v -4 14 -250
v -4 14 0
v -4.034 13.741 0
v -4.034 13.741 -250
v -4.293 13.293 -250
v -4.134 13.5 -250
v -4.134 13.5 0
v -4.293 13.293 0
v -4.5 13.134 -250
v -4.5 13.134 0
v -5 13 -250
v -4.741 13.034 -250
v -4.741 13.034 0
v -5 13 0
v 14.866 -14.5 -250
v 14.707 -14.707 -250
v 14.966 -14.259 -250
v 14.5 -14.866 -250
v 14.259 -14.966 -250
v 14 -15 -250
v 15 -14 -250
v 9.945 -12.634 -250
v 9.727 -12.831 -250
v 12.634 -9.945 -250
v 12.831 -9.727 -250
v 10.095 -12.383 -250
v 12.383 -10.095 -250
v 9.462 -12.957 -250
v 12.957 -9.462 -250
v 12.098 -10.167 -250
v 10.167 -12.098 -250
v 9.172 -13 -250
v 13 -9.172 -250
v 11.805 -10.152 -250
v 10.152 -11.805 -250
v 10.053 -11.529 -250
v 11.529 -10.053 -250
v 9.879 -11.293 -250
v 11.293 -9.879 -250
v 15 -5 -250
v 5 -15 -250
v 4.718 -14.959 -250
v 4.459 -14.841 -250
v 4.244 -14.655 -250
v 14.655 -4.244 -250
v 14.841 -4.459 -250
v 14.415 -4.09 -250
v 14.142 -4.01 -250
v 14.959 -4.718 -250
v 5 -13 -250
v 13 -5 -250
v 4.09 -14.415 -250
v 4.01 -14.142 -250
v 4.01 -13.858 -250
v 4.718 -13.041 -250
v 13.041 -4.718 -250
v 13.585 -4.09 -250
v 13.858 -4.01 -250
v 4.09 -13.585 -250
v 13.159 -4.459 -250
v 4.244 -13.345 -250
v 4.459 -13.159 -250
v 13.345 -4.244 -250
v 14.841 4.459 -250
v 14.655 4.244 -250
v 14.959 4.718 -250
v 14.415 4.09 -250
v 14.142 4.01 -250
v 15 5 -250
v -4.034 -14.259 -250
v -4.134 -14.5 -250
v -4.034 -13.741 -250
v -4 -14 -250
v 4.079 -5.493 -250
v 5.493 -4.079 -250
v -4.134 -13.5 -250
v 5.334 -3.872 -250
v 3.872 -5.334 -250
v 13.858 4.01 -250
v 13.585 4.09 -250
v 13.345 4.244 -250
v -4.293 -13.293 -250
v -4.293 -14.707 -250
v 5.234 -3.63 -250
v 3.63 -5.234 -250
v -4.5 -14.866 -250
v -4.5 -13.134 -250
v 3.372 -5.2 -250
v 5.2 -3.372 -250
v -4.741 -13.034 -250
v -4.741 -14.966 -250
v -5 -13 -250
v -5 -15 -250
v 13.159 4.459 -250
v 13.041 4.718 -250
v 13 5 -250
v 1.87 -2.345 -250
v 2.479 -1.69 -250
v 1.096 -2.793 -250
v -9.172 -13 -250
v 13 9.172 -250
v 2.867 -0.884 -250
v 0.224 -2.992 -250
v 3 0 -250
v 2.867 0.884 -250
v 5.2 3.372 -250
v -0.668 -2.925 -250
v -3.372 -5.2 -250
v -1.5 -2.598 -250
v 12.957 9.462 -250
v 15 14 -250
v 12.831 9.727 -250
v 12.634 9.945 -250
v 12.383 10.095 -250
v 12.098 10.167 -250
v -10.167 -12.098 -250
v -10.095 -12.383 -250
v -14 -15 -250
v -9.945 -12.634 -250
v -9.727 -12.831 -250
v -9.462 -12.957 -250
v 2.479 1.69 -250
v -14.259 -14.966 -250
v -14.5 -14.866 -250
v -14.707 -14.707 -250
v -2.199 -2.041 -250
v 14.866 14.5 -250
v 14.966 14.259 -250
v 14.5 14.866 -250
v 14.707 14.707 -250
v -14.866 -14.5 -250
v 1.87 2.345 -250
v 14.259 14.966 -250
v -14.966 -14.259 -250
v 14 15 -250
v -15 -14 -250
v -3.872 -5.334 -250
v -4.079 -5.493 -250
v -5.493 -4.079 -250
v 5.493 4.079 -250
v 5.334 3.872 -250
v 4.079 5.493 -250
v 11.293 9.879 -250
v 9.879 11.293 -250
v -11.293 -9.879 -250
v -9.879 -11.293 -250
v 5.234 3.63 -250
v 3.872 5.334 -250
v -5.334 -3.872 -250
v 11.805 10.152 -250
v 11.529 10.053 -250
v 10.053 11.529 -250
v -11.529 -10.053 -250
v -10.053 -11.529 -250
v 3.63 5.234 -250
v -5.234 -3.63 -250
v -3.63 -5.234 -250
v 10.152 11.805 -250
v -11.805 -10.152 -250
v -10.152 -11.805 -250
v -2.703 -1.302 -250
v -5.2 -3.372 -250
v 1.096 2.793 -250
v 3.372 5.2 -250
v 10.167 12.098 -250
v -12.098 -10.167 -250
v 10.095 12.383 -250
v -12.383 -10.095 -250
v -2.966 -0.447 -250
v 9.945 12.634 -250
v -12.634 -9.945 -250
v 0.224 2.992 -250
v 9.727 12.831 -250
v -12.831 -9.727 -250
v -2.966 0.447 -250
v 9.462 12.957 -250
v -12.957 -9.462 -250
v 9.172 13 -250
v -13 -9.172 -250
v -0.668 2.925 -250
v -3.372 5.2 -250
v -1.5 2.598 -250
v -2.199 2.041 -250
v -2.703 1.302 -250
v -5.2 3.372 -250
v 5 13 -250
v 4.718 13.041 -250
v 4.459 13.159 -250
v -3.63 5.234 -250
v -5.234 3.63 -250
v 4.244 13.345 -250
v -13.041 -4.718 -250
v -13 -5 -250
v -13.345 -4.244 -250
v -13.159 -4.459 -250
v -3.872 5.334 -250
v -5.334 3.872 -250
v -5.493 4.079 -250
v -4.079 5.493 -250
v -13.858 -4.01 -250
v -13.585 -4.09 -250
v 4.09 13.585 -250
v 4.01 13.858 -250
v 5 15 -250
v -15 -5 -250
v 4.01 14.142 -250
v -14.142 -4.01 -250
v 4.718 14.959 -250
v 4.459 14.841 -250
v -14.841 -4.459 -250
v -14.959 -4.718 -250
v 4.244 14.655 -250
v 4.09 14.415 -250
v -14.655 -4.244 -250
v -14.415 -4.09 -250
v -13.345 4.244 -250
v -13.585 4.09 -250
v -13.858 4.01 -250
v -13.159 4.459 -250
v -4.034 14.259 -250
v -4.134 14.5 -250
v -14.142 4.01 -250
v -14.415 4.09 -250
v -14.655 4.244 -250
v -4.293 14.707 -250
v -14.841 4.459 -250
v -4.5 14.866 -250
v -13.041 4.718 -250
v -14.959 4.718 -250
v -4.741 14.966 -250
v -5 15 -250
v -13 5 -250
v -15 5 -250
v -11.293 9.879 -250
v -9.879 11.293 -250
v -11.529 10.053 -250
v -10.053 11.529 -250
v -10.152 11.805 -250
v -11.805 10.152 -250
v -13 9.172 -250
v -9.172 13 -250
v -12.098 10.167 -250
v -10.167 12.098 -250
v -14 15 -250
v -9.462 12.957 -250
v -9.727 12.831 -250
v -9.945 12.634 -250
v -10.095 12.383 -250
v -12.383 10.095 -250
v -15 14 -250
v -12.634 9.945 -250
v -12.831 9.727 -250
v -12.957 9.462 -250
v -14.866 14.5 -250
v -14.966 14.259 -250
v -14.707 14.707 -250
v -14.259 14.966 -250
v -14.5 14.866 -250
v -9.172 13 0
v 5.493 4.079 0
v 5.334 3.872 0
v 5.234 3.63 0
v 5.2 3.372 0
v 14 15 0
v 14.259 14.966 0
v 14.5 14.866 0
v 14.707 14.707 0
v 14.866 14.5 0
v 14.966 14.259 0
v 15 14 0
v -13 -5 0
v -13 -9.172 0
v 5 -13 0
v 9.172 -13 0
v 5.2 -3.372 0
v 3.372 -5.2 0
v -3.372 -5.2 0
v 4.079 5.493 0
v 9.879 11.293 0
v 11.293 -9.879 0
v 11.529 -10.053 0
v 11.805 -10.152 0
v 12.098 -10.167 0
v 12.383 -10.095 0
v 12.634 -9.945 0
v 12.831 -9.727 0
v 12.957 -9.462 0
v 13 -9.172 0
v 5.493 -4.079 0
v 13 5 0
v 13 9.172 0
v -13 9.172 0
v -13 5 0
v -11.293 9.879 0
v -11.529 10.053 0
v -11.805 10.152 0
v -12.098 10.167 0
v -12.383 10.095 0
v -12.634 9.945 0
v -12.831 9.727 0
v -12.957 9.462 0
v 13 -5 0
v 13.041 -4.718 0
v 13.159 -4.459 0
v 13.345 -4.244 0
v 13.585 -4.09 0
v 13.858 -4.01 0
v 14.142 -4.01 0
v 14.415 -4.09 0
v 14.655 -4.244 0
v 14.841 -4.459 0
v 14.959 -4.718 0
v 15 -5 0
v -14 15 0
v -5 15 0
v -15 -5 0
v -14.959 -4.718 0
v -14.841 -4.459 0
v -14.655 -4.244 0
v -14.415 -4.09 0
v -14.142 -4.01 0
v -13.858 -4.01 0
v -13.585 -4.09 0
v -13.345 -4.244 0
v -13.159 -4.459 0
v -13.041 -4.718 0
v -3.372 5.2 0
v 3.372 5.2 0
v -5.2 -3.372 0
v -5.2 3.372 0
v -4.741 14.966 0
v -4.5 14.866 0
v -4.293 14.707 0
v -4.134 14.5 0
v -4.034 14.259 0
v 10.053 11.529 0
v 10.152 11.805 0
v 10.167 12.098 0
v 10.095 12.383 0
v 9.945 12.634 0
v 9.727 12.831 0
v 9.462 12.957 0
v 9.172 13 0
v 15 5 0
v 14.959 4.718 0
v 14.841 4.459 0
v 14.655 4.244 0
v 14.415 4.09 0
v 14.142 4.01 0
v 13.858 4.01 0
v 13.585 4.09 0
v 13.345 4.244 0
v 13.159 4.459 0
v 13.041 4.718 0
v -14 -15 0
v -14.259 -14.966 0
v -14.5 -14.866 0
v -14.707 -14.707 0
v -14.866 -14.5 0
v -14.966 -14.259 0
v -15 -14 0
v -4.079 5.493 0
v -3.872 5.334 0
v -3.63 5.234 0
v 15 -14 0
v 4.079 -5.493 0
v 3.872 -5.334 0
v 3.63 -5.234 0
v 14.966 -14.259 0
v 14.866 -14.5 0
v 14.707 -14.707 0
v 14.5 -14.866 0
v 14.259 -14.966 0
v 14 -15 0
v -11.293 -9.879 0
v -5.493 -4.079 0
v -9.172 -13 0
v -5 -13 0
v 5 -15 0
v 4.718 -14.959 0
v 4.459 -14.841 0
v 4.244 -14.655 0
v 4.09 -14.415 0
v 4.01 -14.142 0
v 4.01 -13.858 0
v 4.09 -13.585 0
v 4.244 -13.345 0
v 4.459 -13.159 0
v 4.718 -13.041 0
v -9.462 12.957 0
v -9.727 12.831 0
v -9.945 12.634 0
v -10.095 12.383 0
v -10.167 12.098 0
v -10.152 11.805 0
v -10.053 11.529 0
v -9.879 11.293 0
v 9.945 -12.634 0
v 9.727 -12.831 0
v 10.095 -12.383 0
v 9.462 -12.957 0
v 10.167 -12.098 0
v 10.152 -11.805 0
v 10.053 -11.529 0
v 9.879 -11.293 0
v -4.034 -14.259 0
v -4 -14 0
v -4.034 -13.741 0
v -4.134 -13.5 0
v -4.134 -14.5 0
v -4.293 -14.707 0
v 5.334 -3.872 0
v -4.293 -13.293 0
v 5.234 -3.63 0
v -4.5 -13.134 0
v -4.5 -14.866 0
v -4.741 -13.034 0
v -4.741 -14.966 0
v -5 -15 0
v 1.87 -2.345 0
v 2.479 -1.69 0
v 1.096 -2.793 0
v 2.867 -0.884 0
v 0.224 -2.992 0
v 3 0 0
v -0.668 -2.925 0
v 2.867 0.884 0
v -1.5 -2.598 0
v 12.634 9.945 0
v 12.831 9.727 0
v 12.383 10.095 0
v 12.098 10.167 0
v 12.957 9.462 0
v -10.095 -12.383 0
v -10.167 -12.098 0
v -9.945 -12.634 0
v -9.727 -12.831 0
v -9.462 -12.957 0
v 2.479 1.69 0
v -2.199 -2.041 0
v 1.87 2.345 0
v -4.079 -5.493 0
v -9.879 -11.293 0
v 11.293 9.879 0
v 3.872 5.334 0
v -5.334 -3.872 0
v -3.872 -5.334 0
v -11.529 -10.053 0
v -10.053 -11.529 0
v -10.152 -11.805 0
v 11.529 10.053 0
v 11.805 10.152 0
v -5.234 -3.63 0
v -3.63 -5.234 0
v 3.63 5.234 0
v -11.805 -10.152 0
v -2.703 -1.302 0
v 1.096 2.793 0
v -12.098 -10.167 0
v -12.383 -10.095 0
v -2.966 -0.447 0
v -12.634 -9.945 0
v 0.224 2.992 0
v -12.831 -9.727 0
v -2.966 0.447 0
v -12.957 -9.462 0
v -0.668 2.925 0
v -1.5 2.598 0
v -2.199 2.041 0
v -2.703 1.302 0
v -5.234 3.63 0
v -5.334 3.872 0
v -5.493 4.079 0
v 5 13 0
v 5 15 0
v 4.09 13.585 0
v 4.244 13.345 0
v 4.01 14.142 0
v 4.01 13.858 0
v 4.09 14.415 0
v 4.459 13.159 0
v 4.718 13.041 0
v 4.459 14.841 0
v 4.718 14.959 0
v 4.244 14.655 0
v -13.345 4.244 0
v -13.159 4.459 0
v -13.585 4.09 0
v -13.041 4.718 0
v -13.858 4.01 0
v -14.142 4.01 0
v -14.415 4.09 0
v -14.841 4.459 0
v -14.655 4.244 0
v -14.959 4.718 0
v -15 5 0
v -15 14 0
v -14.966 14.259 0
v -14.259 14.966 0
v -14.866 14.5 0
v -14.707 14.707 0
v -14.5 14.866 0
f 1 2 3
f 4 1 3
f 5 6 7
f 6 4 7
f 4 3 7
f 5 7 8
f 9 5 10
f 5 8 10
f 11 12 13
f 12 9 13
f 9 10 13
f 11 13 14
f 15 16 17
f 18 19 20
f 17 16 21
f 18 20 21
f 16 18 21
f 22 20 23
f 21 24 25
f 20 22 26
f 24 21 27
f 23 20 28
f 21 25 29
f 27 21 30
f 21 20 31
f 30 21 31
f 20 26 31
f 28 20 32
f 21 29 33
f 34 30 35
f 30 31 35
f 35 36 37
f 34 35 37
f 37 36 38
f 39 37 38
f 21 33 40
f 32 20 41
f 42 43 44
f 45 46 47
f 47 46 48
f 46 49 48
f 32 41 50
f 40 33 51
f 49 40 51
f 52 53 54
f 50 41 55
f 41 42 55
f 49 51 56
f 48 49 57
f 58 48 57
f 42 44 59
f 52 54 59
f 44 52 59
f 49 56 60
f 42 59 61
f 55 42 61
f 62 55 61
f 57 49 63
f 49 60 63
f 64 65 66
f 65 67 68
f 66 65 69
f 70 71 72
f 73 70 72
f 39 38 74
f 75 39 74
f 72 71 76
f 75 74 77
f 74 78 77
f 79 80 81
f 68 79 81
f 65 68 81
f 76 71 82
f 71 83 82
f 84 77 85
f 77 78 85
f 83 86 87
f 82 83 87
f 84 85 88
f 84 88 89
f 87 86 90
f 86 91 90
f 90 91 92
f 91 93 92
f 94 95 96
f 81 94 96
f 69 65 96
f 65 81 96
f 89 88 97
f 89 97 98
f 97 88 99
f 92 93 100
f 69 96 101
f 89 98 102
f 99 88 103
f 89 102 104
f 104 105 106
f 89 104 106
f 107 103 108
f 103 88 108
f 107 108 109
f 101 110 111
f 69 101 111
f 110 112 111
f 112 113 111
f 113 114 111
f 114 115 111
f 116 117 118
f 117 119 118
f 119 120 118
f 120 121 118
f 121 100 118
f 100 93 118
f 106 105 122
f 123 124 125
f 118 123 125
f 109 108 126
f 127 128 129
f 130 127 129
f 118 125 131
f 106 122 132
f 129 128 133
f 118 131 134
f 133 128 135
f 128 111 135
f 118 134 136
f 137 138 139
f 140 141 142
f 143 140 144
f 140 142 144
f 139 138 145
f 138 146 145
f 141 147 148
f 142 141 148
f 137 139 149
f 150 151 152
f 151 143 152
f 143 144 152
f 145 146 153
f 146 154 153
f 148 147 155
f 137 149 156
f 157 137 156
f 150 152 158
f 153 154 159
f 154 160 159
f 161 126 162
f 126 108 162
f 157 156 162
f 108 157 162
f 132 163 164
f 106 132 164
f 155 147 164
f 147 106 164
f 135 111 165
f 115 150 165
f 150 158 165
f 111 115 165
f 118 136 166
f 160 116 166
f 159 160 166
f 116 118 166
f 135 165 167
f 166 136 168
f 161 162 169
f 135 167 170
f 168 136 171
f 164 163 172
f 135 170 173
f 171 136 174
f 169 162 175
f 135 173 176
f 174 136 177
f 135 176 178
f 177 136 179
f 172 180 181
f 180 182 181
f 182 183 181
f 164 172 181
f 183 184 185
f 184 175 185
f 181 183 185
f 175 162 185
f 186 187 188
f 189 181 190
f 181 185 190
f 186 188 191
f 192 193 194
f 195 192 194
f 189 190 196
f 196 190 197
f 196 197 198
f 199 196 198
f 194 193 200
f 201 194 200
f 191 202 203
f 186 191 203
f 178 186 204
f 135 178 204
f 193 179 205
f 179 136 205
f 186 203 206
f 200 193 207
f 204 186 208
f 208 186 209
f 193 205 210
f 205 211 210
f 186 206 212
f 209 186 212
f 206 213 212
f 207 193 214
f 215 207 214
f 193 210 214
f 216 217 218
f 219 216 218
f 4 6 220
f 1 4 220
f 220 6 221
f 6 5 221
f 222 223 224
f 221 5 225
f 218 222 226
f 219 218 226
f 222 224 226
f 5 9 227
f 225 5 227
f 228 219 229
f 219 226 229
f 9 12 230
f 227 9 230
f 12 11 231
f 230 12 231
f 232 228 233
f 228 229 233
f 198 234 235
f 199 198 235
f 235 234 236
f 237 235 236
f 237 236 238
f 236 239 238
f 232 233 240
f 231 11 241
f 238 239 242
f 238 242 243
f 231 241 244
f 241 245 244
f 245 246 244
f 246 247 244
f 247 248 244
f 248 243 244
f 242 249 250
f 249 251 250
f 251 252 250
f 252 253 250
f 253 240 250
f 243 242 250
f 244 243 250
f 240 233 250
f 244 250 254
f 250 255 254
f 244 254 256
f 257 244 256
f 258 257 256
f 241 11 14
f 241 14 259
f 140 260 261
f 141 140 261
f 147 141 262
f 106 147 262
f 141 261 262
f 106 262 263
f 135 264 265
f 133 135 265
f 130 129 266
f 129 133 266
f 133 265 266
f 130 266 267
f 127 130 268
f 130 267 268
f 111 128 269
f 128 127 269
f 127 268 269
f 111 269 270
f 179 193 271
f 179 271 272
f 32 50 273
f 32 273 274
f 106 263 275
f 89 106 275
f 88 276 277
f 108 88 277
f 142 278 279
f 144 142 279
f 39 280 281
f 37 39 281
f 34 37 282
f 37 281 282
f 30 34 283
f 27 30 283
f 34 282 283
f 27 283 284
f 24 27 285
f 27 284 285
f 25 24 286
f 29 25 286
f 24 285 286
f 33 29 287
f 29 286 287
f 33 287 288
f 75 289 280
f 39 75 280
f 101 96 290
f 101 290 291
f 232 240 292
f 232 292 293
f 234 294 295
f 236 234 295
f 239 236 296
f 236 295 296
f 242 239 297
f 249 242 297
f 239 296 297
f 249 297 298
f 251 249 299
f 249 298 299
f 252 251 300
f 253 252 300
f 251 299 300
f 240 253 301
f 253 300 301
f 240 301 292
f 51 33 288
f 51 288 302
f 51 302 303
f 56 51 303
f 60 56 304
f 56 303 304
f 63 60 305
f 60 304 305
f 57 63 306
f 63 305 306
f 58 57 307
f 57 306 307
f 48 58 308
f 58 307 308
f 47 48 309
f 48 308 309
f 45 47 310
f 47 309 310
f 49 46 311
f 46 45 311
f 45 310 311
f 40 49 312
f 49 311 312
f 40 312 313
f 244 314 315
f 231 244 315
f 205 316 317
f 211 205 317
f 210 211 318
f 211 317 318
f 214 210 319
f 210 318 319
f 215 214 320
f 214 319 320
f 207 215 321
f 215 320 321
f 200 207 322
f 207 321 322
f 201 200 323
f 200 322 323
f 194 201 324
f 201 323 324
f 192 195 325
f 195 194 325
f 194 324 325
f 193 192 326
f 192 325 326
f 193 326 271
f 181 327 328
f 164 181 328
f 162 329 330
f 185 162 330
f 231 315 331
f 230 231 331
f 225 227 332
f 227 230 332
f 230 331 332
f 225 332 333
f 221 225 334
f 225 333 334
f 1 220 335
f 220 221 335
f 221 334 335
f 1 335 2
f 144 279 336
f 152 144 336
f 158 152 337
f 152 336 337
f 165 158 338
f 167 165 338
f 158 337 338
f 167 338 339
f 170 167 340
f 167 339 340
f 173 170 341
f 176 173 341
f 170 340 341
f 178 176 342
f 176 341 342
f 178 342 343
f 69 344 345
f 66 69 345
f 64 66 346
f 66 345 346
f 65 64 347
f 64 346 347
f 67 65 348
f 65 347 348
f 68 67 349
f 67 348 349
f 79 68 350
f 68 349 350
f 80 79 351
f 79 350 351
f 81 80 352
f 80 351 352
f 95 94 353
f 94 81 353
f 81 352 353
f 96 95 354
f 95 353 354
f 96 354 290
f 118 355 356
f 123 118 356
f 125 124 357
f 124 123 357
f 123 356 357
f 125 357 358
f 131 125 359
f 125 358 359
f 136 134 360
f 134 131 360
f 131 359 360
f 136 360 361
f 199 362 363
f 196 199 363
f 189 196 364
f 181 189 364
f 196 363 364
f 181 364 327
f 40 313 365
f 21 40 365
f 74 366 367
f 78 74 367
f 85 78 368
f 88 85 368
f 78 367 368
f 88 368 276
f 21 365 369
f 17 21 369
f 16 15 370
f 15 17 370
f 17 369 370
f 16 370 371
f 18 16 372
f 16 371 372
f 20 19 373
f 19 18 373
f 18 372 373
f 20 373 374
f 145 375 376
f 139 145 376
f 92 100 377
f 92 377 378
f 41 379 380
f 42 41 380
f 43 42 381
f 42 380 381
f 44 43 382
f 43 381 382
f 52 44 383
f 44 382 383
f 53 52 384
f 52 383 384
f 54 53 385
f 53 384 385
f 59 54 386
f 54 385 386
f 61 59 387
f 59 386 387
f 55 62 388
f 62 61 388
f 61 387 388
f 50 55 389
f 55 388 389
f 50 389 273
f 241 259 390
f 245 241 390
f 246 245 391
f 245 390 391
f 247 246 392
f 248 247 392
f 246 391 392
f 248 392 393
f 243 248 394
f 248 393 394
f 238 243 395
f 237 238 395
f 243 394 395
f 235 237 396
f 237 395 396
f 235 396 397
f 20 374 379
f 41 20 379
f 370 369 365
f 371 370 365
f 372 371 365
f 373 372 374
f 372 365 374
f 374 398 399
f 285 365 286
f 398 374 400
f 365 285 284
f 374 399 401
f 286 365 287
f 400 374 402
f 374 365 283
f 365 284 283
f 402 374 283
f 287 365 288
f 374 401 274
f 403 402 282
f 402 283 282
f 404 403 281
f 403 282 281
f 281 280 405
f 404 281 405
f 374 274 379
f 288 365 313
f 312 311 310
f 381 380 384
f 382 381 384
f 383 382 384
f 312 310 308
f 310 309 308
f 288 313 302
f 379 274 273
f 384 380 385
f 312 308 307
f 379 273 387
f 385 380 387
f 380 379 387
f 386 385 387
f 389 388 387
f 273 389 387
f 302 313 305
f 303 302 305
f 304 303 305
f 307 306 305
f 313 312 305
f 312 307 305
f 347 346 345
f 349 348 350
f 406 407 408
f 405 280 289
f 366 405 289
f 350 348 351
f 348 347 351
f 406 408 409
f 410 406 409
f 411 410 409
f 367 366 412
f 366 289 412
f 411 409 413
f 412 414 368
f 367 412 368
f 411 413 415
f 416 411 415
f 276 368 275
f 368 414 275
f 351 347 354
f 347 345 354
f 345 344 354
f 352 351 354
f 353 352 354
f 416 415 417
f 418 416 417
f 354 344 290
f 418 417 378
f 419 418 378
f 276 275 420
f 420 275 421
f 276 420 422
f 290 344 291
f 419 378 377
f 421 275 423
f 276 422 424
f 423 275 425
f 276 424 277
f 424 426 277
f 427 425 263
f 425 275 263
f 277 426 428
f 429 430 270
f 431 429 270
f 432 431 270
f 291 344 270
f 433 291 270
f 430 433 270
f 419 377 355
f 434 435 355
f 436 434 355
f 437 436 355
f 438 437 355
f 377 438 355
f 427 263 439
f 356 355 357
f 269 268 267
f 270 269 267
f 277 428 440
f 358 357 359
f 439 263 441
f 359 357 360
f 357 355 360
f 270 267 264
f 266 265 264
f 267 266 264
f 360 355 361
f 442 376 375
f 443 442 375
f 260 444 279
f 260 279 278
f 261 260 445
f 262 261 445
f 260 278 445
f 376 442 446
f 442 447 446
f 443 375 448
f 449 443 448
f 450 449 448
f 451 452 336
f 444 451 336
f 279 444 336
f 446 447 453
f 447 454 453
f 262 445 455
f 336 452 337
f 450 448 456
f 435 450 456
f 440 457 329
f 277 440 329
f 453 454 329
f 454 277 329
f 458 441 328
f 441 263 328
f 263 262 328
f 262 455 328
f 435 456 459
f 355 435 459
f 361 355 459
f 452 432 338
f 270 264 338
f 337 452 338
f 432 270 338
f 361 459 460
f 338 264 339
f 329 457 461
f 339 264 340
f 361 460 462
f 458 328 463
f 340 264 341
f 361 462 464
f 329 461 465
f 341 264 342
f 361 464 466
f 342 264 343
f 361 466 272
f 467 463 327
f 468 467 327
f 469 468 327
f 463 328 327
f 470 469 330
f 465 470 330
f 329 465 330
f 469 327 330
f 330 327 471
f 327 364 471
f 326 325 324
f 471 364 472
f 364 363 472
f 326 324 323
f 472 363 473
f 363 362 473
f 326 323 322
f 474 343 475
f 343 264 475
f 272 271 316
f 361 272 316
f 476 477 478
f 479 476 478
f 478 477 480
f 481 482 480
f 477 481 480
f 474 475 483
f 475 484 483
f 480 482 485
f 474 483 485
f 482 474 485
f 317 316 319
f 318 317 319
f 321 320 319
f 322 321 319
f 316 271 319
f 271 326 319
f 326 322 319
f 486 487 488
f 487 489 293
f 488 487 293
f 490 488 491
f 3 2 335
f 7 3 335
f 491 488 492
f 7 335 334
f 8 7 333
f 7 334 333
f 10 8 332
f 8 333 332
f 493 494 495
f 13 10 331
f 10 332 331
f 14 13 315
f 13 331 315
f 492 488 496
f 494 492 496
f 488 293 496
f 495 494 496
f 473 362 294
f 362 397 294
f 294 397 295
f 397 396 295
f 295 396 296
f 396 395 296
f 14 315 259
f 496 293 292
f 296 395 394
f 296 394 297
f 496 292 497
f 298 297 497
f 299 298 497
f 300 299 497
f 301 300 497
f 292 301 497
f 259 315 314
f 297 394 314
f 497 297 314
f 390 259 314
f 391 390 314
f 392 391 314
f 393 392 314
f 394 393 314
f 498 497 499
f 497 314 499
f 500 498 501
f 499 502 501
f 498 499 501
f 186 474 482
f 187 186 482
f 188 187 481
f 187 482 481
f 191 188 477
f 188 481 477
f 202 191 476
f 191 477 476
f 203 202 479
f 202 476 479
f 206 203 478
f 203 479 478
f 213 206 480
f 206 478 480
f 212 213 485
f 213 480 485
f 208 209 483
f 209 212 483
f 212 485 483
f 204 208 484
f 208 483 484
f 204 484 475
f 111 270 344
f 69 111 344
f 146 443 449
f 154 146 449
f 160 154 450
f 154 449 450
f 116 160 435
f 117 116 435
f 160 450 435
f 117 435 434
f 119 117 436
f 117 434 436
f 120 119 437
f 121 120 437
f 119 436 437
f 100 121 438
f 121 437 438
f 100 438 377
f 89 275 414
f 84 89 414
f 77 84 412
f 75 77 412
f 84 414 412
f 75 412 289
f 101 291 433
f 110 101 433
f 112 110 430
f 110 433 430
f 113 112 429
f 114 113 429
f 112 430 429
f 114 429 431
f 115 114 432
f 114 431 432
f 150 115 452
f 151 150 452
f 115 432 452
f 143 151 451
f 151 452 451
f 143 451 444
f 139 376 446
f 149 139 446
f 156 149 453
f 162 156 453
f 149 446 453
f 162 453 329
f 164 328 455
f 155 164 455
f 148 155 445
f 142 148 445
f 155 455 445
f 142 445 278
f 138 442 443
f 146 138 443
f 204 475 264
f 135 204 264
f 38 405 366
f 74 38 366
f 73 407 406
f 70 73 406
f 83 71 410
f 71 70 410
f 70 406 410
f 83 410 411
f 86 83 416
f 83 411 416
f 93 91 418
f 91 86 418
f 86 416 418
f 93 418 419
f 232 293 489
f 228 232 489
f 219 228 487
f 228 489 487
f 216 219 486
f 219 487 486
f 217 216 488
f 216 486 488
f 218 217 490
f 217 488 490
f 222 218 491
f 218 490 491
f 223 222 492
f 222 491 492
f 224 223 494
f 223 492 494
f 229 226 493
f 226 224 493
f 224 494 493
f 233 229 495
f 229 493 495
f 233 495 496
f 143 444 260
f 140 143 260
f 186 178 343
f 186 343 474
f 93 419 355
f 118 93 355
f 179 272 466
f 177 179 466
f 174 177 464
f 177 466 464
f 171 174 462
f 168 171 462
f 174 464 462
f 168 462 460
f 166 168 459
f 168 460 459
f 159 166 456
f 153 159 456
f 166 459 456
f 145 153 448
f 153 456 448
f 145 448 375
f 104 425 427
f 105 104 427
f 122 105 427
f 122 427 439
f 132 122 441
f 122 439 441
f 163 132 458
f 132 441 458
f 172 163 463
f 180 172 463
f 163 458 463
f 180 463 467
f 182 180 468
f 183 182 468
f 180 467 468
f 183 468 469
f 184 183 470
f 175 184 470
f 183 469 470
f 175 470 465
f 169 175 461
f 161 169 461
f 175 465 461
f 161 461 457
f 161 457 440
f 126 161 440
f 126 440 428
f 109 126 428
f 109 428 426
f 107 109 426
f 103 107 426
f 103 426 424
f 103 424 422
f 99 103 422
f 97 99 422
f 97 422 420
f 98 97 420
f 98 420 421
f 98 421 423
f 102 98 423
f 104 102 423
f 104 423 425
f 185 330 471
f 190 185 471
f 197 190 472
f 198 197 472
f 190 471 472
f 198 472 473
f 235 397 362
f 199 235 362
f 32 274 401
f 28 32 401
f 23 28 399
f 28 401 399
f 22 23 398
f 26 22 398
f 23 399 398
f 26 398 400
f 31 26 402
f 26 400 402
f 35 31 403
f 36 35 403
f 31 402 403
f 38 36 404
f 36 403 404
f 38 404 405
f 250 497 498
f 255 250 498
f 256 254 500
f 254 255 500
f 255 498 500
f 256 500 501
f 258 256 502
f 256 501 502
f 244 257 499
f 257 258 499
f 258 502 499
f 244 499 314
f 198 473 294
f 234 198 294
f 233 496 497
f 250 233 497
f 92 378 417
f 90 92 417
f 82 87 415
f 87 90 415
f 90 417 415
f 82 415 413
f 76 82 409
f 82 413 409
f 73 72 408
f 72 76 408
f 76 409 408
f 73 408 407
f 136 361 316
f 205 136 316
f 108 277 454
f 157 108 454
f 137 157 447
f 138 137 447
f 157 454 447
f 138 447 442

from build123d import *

# Parameters (mm, degrees)
SALIENTE_EXTRUIR1_DEPTH = 1400
CROQUIS2_R              = 3
CORTAR_EXTRUIR1_DEPTH   = 1401.160705062
CORTAR_EXTRUIR3_DEPTH   = 1401.160705062
CROQUIS4_W              = 1150
CROQUIS4_H              = 72.748415438
CORTAR_EXTRUIR5_DEPTH   = 254


with BuildPart() as part:
    # Croquis1 → Saliente-Extruir1 (new body)
    with BuildSketch(Plane.XY):
        with BuildLine():
            Line((-14, 15), (14, 15))
            ThreePointArc((14, 15), (14.707106781, 14.707106781), (15, 14))
            Line((15, 14), (15, -14))
            ThreePointArc((15, -14), (14.707106781, -14.707106781), (14, -15))
            Line((14, -15), (-14, -15))
            ThreePointArc((-14, -15), (-14.707106781, -14.707106781), (-15, -14))
            Line((-15, -14), (-15, 14))
            ThreePointArc((-15, 14), (-14.707106781, 14.707106781), (-14, 15))
        make_face()
    extrude(amount=-SALIENTE_EXTRUIR1_DEPTH)

    # Croquis2 → Cortar-Extruir1 (cut, through all)
    with BuildSketch(Plane.XY):
        Circle(CROQUIS2_R)
    extrude(amount=-CORTAR_EXTRUIR1_DEPTH, mode=Mode.SUBTRACT)

    # Croquis3 → Cortar-Extruir3 (cut, through all)
    with BuildSketch(Plane.XY):
        with BuildLine():
            Line((-5.492893219, 4.078679656), (-11.292893219, 9.878679656))
            ThreePointArc((-11.292893219, 9.878679656), (-12.382683432, 10.095452408), (-13, 9.171572875))
            Line((-13, 9.171572875), (-13, 5))
            ThreePointArc((-13, 5), (-14, 4), (-15, 5))
            Line((-15, 5), (-15, -5))
            ThreePointArc((-15, -5), (-14, -4), (-13, -5))
            Line((-13, -5), (-13, -9.171572875))
            ThreePointArc((-13, -9.171572875), (-12.382683432, -10.095452408), (-11.292893219, -9.878679656))
            Line((-11.292893219, -9.878679656), (-5.492893219, -4.078679656))
            ThreePointArc((-5.492893219, -4.078679656), (-5.276120467, -3.754256308), (-5.2, -3.371572875))
            Line((-5.2, -3.371572875), (-5.2, 3.371572875))
            ThreePointArc((-5.2, 3.371572875), (-5.276120467, 3.754256308), (-5.492893219, 4.078679656))
        make_face()
        with BuildLine():
            ThreePointArc((-9.171572875, 13), (-10.095452408, 12.382683432), (-9.878679656, 11.292893219))
            Line((-9.878679656, 11.292893219), (-4.078679656, 5.492893219))
            ThreePointArc((-4.078679656, 5.492893219), (-3.754256308, 5.276120467), (-3.371572875, 5.2))
            Line((-3.371572875, 5.2), (3.371572875, 5.2))
            ThreePointArc((3.371572875, 5.2), (3.754256308, 5.276120467), (4.078679656, 5.492893219))
            Line((4.078679656, 5.492893219), (9.878679656, 11.292893219))
            ThreePointArc((9.878679656, 11.292893219), (10.095452408, 12.382683432), (9.171572875, 13))
            Line((9.171572875, 13), (5, 13))
            ThreePointArc((5, 13), (4, 14), (5, 15))
            Line((5, 15), (-5, 15))
            ThreePointArc((-5, 15), (-4.292893219, 14.707106781), (-4, 14))
            ThreePointArc((-4, 14), (-4.292893219, 13.292893219), (-5, 13))
            Line((-5, 13), (-9.171572875, 13))
        make_face()
        with BuildLine():
            Line((9.878679656, -11.292893219), (4.078679656, -5.492893219))
            ThreePointArc((4.078679656, -5.492893219), (3.754256308, -5.276120467), (3.371572875, -5.2))
            Line((3.371572875, -5.2), (-3.371572875, -5.2))
            ThreePointArc((-3.371572875, -5.2), (-3.754256308, -5.276120467), (-4.078679656, -5.492893219))
            Line((-4.078679656, -5.492893219), (-9.878679656, -11.292893219))
            ThreePointArc((-9.878679656, -11.292893219), (-10.095452408, -12.382683432), (-9.171572875, -13))
            Line((-9.171572875, -13), (-5, -13))
            ThreePointArc((-5, -13), (-4.292893219, -13.292893219), (-4, -14))
            ThreePointArc((-4, -14), (-4.292893219, -14.707106781), (-5, -15))
            Line((-5, -15), (5, -15))
            ThreePointArc((5, -15), (4, -14), (5, -13))
            Line((5, -13), (9.171572875, -13))
            ThreePointArc((9.171572875, -13), (10.095452408, -12.382683432), (9.878679656, -11.292893219))
        make_face()
        with BuildLine():
            ThreePointArc((13, 9.171572875), (12.382683432, 10.095452408), (11.292893219, 9.878679656))
            Line((11.292893219, 9.878679656), (5.492893219, 4.078679656))
            ThreePointArc((5.492893219, 4.078679656), (5.276120467, 3.754256308), (5.2, 3.371572875))
            Line((5.2, 3.371572875), (5.2, -3.371572875))
            ThreePointArc((5.2, -3.371572875), (5.276120467, -3.754256308), (5.492893219, -4.078679656))
            Line((5.492893219, -4.078679656), (11.292893219, -9.878679656))
            ThreePointArc((11.292893219, -9.878679656), (12.382683432, -10.095452408), (13, -9.171572875))
            Line((13, -9.171572875), (13, -5))
            ThreePointArc((13, -5), (14, -4), (15, -5))
            Line((15, -5), (15, 5))
            ThreePointArc((15, 5), (14, 4), (13, 5))
            Line((13, 5), (13, 9.171572875))
        make_face()
    extrude(amount=-CORTAR_EXTRUIR3_DEPTH, mode=Mode.SUBTRACT)

    # Croquis4 → Cortar-Extruir5 (cut)
    with BuildSketch(Plane.ZY.offset(15)):
        with Locations((-825, -21.374207719)):
            Rectangle(CROQUIS4_W, CROQUIS4_H)
    extrude(amount=-CORTAR_EXTRUIR5_DEPTH, mode=Mode.SUBTRACT)


solid = part.part
